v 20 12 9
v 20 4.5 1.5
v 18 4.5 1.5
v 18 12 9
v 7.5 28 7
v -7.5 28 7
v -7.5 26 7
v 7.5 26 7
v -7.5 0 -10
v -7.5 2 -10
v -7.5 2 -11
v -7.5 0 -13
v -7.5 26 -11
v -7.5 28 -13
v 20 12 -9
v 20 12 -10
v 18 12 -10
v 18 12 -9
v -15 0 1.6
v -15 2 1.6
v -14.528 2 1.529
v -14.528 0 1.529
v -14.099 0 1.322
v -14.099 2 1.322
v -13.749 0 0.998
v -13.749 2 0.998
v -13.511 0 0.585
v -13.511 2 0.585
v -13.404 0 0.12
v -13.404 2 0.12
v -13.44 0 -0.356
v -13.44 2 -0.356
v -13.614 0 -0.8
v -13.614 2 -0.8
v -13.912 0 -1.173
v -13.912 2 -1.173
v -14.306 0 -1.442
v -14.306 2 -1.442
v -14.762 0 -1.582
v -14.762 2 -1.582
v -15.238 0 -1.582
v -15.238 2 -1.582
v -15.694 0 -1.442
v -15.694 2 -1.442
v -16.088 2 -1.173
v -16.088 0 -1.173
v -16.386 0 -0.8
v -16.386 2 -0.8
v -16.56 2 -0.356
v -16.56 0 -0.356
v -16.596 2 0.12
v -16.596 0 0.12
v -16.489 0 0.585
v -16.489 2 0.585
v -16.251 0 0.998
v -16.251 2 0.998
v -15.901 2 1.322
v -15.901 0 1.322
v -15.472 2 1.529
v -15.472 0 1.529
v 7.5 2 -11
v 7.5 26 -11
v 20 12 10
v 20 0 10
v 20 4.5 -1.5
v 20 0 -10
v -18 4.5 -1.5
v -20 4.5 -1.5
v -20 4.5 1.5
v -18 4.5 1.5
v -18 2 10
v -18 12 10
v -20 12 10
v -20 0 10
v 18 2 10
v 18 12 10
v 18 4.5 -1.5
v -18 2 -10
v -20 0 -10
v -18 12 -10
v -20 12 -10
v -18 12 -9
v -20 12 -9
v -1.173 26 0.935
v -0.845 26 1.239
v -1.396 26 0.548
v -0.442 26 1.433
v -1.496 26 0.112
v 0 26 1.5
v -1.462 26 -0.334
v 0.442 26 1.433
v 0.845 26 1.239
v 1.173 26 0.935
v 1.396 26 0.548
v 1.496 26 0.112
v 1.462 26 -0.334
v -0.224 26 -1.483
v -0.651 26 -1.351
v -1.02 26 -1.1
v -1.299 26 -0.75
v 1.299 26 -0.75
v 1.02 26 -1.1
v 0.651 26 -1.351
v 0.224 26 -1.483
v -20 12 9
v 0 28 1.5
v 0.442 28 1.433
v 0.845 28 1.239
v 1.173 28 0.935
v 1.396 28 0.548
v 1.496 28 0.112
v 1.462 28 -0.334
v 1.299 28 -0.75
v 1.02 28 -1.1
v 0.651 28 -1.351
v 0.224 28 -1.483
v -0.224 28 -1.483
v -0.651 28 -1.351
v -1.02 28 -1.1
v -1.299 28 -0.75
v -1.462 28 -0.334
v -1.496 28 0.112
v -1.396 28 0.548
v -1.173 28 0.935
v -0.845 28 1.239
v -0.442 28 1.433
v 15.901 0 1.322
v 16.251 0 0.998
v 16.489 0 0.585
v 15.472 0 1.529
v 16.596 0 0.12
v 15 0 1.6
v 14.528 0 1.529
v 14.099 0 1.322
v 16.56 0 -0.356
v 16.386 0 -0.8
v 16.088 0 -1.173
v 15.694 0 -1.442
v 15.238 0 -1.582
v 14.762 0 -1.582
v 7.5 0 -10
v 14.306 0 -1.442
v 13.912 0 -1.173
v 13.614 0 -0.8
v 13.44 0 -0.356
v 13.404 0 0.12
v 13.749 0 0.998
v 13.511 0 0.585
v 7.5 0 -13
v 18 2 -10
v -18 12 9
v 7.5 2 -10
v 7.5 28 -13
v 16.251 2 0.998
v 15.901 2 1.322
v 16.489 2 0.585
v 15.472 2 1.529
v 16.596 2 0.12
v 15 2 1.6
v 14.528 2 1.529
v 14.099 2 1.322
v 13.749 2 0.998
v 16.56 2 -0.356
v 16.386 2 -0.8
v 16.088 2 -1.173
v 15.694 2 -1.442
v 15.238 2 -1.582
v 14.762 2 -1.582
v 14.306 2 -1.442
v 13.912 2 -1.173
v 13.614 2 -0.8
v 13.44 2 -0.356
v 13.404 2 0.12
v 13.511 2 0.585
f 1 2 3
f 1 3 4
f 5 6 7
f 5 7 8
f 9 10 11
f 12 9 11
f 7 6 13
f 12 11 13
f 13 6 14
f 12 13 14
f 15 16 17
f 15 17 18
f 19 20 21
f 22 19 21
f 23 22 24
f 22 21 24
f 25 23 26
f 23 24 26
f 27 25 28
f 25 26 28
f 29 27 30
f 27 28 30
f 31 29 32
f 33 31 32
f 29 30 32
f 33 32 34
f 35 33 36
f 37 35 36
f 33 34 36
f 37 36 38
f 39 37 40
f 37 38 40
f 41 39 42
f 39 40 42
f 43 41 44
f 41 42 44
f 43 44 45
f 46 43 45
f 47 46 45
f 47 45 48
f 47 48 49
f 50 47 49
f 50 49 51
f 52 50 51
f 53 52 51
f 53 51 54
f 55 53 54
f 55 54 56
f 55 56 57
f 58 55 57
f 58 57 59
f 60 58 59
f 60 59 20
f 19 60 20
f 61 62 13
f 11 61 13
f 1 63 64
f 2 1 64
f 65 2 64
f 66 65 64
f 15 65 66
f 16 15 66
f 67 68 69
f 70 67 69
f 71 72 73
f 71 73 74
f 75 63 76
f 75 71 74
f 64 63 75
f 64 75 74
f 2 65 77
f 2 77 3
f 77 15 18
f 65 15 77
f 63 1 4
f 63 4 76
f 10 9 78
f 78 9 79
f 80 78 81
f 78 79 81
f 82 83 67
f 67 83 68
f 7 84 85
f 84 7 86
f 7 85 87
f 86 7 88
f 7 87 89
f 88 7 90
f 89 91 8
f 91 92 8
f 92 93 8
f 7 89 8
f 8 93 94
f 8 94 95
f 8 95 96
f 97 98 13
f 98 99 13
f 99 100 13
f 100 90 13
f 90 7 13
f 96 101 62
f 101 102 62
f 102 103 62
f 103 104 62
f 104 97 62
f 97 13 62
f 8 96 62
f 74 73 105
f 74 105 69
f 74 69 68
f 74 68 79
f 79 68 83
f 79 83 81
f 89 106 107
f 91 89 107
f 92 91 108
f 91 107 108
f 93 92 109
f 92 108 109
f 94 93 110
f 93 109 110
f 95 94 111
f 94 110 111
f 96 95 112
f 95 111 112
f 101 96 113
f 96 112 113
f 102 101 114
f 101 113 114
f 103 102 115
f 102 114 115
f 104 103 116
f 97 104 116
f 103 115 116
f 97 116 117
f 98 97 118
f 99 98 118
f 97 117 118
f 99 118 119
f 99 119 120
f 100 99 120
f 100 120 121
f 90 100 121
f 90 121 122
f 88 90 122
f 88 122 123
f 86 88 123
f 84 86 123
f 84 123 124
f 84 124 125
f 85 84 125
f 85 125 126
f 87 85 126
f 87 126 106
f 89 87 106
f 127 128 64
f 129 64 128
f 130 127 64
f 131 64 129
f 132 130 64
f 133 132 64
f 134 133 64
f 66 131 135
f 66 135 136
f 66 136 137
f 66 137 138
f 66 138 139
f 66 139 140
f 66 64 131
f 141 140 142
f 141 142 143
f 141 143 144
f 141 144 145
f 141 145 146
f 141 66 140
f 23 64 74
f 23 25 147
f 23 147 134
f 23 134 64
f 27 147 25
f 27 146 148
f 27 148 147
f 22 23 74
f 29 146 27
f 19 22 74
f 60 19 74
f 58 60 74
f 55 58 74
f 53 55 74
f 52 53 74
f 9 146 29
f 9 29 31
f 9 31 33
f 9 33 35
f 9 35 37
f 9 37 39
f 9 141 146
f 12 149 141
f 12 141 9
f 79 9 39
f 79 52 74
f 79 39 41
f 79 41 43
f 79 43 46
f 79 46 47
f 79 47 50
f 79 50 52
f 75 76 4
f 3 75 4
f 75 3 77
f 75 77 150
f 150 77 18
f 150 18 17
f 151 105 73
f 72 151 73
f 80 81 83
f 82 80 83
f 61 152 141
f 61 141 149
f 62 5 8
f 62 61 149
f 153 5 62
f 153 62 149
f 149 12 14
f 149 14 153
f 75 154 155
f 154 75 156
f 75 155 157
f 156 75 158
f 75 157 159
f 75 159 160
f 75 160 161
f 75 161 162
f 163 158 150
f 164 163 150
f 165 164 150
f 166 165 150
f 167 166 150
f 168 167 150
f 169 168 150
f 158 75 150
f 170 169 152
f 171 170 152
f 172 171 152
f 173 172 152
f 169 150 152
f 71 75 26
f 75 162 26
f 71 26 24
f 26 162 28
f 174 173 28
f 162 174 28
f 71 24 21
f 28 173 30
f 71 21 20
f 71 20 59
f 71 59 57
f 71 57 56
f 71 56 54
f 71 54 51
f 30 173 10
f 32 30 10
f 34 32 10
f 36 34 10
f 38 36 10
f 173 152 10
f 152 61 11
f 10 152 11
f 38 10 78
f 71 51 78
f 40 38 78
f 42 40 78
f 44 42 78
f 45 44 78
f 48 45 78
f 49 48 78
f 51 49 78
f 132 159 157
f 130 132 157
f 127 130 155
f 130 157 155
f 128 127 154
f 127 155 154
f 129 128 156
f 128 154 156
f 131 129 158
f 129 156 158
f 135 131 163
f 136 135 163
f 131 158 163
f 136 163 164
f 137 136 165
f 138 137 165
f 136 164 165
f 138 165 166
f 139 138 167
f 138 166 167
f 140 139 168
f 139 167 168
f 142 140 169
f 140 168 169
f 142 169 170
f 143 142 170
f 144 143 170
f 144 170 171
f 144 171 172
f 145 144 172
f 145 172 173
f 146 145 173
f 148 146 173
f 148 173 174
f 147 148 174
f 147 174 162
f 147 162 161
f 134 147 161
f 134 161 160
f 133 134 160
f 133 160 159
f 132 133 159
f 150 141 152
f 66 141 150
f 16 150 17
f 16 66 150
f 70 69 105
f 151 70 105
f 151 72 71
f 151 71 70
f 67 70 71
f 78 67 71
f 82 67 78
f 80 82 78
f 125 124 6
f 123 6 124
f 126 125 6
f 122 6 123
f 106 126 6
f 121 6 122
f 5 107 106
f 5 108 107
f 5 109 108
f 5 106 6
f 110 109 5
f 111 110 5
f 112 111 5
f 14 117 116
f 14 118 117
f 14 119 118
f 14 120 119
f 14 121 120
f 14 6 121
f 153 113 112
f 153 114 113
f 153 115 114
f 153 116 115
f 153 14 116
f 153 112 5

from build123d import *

# Parameters (mm, degrees)
EXTRUDE_1_DEPTH     = 2
SKETCH_2_W          = 15
SKETCH_2_H          = 28
EXTRUDE_2_DEPTH     = 2
EXTRUDE_3_DEPTH     = 2
SKETCH_4_W          = 15
SKETCH_4_H          = 20
EXTRUDE_4_DEPTH     = 2
CUT_EXTRUDE_1_REACH = 37.285
SKETCH_5_R          = 1.6
CUT_EXTRUDE_2_REACH = 38.783
SKETCH_6_R          = 1.5


with BuildPart() as part:
    # 草图1 → 凸台-拉伸1 (new body)
    with BuildSketch(Plane(origin=(0, 0, 0), x_dir=(1, 0, 0), z_dir=(0, 1, 0))):
        Polygon((7.5, 10), (20, 10), (20, -10), (-20, -10), (-20, 10), (-7.5, 10), (-7.5, 13), (7.5, 13), align=None)
    extrude(amount=EXTRUDE_1_DEPTH)

    # 草图2 → 凸台-拉伸2 (add)
    with BuildSketch(Plane(origin=(0, 0, -13), x_dir=(-1, 0, 0), z_dir=(0, 0, -1))):
        with Locations((0, 14)):
            Rectangle(SKETCH_2_W, SKETCH_2_H)
    extrude(amount=-EXTRUDE_2_DEPTH)

    # 草图3 → 凸台-拉伸3 (add)
    with BuildSketch(Plane.ZY.offset(20)):
        Polygon((1.5, 4.5), (9, 12), (10, 12), (10, 0), (-10, 0), (-10, 12), (-9, 12), (-1.5, 4.5), align=None)
    extrude_3 = extrude(amount=-EXTRUDE_3_DEPTH)

    # 镜向1: 凸台-拉伸3 across plane
    add(extrude_3.mirror(Plane(origin=(0, 0, 0), x_dir=(0, 0, 1), z_dir=(1, 0, 0))))

    # 草图4 → 凸台-拉伸4 (add)
    with BuildSketch(Plane(origin=(0, 28, 0), x_dir=(1, 0, 0), z_dir=(0, 1, 0))):
        with Locations((0, 3)):
            Rectangle(SKETCH_4_W, SKETCH_4_H)
    extrude(amount=-EXTRUDE_4_DEPTH)

    # 草图5 → 切除-拉伸1 (cut, up to next)
    with BuildSketch(Plane(origin=(0, 2, 0), x_dir=(1, 0, 0), z_dir=(0, 1, 0)), mode=Mode.PRIVATE) as cut_extrude_1_sk1:
        with Locations(Location((-15, 0, 0), (0, 0, 270))):
            Circle(SKETCH_5_R)
    cut_extrude_1_tool1 = extrude(cut_extrude_1_sk1.sketch, amount=-CUT_EXTRUDE_1_REACH, mode=Mode.PRIVATE) & part.part
    # 草图5 → 切除-拉伸1 (cut, up to next)
    with BuildSketch(Plane(origin=(0, 2, 0), x_dir=(1, 0, 0), z_dir=(0, 1, 0)), mode=Mode.PRIVATE) as cut_extrude_1_sk2:
        with Locations(Location((15, 0, 0), (0, 0, 270))):
            Circle(SKETCH_5_R)
    cut_extrude_1_tool2 = extrude(cut_extrude_1_sk2.sketch, amount=-CUT_EXTRUDE_1_REACH, mode=Mode.PRIVATE) & part.part
    add(cut_extrude_1_tool1.solids().sort_by_distance((-15, 2, 0))[0], mode=Mode.SUBTRACT)
    add(cut_extrude_1_tool2.solids().sort_by_distance((15, 2, 0))[0], mode=Mode.SUBTRACT)

    # 草图6 → 切除-拉伸2 (cut, up to next)
    with BuildSketch(Plane(origin=(0, 28, 0), x_dir=(1, 0, 0), z_dir=(0, 1, 0)), mode=Mode.PRIVATE) as cut_extrude_2_sk1:
        with Locations(Location((0, 0, 0), (0, 0, 270))):
            Circle(SKETCH_6_R)
    cut_extrude_2_tool1 = extrude(cut_extrude_2_sk1.sketch, amount=-CUT_EXTRUDE_2_REACH, mode=Mode.PRIVATE) & part.part
    add(cut_extrude_2_tool1.solids().sort_by_distance((0, 28, 0))[0], mode=Mode.SUBTRACT)


solid = part.part
